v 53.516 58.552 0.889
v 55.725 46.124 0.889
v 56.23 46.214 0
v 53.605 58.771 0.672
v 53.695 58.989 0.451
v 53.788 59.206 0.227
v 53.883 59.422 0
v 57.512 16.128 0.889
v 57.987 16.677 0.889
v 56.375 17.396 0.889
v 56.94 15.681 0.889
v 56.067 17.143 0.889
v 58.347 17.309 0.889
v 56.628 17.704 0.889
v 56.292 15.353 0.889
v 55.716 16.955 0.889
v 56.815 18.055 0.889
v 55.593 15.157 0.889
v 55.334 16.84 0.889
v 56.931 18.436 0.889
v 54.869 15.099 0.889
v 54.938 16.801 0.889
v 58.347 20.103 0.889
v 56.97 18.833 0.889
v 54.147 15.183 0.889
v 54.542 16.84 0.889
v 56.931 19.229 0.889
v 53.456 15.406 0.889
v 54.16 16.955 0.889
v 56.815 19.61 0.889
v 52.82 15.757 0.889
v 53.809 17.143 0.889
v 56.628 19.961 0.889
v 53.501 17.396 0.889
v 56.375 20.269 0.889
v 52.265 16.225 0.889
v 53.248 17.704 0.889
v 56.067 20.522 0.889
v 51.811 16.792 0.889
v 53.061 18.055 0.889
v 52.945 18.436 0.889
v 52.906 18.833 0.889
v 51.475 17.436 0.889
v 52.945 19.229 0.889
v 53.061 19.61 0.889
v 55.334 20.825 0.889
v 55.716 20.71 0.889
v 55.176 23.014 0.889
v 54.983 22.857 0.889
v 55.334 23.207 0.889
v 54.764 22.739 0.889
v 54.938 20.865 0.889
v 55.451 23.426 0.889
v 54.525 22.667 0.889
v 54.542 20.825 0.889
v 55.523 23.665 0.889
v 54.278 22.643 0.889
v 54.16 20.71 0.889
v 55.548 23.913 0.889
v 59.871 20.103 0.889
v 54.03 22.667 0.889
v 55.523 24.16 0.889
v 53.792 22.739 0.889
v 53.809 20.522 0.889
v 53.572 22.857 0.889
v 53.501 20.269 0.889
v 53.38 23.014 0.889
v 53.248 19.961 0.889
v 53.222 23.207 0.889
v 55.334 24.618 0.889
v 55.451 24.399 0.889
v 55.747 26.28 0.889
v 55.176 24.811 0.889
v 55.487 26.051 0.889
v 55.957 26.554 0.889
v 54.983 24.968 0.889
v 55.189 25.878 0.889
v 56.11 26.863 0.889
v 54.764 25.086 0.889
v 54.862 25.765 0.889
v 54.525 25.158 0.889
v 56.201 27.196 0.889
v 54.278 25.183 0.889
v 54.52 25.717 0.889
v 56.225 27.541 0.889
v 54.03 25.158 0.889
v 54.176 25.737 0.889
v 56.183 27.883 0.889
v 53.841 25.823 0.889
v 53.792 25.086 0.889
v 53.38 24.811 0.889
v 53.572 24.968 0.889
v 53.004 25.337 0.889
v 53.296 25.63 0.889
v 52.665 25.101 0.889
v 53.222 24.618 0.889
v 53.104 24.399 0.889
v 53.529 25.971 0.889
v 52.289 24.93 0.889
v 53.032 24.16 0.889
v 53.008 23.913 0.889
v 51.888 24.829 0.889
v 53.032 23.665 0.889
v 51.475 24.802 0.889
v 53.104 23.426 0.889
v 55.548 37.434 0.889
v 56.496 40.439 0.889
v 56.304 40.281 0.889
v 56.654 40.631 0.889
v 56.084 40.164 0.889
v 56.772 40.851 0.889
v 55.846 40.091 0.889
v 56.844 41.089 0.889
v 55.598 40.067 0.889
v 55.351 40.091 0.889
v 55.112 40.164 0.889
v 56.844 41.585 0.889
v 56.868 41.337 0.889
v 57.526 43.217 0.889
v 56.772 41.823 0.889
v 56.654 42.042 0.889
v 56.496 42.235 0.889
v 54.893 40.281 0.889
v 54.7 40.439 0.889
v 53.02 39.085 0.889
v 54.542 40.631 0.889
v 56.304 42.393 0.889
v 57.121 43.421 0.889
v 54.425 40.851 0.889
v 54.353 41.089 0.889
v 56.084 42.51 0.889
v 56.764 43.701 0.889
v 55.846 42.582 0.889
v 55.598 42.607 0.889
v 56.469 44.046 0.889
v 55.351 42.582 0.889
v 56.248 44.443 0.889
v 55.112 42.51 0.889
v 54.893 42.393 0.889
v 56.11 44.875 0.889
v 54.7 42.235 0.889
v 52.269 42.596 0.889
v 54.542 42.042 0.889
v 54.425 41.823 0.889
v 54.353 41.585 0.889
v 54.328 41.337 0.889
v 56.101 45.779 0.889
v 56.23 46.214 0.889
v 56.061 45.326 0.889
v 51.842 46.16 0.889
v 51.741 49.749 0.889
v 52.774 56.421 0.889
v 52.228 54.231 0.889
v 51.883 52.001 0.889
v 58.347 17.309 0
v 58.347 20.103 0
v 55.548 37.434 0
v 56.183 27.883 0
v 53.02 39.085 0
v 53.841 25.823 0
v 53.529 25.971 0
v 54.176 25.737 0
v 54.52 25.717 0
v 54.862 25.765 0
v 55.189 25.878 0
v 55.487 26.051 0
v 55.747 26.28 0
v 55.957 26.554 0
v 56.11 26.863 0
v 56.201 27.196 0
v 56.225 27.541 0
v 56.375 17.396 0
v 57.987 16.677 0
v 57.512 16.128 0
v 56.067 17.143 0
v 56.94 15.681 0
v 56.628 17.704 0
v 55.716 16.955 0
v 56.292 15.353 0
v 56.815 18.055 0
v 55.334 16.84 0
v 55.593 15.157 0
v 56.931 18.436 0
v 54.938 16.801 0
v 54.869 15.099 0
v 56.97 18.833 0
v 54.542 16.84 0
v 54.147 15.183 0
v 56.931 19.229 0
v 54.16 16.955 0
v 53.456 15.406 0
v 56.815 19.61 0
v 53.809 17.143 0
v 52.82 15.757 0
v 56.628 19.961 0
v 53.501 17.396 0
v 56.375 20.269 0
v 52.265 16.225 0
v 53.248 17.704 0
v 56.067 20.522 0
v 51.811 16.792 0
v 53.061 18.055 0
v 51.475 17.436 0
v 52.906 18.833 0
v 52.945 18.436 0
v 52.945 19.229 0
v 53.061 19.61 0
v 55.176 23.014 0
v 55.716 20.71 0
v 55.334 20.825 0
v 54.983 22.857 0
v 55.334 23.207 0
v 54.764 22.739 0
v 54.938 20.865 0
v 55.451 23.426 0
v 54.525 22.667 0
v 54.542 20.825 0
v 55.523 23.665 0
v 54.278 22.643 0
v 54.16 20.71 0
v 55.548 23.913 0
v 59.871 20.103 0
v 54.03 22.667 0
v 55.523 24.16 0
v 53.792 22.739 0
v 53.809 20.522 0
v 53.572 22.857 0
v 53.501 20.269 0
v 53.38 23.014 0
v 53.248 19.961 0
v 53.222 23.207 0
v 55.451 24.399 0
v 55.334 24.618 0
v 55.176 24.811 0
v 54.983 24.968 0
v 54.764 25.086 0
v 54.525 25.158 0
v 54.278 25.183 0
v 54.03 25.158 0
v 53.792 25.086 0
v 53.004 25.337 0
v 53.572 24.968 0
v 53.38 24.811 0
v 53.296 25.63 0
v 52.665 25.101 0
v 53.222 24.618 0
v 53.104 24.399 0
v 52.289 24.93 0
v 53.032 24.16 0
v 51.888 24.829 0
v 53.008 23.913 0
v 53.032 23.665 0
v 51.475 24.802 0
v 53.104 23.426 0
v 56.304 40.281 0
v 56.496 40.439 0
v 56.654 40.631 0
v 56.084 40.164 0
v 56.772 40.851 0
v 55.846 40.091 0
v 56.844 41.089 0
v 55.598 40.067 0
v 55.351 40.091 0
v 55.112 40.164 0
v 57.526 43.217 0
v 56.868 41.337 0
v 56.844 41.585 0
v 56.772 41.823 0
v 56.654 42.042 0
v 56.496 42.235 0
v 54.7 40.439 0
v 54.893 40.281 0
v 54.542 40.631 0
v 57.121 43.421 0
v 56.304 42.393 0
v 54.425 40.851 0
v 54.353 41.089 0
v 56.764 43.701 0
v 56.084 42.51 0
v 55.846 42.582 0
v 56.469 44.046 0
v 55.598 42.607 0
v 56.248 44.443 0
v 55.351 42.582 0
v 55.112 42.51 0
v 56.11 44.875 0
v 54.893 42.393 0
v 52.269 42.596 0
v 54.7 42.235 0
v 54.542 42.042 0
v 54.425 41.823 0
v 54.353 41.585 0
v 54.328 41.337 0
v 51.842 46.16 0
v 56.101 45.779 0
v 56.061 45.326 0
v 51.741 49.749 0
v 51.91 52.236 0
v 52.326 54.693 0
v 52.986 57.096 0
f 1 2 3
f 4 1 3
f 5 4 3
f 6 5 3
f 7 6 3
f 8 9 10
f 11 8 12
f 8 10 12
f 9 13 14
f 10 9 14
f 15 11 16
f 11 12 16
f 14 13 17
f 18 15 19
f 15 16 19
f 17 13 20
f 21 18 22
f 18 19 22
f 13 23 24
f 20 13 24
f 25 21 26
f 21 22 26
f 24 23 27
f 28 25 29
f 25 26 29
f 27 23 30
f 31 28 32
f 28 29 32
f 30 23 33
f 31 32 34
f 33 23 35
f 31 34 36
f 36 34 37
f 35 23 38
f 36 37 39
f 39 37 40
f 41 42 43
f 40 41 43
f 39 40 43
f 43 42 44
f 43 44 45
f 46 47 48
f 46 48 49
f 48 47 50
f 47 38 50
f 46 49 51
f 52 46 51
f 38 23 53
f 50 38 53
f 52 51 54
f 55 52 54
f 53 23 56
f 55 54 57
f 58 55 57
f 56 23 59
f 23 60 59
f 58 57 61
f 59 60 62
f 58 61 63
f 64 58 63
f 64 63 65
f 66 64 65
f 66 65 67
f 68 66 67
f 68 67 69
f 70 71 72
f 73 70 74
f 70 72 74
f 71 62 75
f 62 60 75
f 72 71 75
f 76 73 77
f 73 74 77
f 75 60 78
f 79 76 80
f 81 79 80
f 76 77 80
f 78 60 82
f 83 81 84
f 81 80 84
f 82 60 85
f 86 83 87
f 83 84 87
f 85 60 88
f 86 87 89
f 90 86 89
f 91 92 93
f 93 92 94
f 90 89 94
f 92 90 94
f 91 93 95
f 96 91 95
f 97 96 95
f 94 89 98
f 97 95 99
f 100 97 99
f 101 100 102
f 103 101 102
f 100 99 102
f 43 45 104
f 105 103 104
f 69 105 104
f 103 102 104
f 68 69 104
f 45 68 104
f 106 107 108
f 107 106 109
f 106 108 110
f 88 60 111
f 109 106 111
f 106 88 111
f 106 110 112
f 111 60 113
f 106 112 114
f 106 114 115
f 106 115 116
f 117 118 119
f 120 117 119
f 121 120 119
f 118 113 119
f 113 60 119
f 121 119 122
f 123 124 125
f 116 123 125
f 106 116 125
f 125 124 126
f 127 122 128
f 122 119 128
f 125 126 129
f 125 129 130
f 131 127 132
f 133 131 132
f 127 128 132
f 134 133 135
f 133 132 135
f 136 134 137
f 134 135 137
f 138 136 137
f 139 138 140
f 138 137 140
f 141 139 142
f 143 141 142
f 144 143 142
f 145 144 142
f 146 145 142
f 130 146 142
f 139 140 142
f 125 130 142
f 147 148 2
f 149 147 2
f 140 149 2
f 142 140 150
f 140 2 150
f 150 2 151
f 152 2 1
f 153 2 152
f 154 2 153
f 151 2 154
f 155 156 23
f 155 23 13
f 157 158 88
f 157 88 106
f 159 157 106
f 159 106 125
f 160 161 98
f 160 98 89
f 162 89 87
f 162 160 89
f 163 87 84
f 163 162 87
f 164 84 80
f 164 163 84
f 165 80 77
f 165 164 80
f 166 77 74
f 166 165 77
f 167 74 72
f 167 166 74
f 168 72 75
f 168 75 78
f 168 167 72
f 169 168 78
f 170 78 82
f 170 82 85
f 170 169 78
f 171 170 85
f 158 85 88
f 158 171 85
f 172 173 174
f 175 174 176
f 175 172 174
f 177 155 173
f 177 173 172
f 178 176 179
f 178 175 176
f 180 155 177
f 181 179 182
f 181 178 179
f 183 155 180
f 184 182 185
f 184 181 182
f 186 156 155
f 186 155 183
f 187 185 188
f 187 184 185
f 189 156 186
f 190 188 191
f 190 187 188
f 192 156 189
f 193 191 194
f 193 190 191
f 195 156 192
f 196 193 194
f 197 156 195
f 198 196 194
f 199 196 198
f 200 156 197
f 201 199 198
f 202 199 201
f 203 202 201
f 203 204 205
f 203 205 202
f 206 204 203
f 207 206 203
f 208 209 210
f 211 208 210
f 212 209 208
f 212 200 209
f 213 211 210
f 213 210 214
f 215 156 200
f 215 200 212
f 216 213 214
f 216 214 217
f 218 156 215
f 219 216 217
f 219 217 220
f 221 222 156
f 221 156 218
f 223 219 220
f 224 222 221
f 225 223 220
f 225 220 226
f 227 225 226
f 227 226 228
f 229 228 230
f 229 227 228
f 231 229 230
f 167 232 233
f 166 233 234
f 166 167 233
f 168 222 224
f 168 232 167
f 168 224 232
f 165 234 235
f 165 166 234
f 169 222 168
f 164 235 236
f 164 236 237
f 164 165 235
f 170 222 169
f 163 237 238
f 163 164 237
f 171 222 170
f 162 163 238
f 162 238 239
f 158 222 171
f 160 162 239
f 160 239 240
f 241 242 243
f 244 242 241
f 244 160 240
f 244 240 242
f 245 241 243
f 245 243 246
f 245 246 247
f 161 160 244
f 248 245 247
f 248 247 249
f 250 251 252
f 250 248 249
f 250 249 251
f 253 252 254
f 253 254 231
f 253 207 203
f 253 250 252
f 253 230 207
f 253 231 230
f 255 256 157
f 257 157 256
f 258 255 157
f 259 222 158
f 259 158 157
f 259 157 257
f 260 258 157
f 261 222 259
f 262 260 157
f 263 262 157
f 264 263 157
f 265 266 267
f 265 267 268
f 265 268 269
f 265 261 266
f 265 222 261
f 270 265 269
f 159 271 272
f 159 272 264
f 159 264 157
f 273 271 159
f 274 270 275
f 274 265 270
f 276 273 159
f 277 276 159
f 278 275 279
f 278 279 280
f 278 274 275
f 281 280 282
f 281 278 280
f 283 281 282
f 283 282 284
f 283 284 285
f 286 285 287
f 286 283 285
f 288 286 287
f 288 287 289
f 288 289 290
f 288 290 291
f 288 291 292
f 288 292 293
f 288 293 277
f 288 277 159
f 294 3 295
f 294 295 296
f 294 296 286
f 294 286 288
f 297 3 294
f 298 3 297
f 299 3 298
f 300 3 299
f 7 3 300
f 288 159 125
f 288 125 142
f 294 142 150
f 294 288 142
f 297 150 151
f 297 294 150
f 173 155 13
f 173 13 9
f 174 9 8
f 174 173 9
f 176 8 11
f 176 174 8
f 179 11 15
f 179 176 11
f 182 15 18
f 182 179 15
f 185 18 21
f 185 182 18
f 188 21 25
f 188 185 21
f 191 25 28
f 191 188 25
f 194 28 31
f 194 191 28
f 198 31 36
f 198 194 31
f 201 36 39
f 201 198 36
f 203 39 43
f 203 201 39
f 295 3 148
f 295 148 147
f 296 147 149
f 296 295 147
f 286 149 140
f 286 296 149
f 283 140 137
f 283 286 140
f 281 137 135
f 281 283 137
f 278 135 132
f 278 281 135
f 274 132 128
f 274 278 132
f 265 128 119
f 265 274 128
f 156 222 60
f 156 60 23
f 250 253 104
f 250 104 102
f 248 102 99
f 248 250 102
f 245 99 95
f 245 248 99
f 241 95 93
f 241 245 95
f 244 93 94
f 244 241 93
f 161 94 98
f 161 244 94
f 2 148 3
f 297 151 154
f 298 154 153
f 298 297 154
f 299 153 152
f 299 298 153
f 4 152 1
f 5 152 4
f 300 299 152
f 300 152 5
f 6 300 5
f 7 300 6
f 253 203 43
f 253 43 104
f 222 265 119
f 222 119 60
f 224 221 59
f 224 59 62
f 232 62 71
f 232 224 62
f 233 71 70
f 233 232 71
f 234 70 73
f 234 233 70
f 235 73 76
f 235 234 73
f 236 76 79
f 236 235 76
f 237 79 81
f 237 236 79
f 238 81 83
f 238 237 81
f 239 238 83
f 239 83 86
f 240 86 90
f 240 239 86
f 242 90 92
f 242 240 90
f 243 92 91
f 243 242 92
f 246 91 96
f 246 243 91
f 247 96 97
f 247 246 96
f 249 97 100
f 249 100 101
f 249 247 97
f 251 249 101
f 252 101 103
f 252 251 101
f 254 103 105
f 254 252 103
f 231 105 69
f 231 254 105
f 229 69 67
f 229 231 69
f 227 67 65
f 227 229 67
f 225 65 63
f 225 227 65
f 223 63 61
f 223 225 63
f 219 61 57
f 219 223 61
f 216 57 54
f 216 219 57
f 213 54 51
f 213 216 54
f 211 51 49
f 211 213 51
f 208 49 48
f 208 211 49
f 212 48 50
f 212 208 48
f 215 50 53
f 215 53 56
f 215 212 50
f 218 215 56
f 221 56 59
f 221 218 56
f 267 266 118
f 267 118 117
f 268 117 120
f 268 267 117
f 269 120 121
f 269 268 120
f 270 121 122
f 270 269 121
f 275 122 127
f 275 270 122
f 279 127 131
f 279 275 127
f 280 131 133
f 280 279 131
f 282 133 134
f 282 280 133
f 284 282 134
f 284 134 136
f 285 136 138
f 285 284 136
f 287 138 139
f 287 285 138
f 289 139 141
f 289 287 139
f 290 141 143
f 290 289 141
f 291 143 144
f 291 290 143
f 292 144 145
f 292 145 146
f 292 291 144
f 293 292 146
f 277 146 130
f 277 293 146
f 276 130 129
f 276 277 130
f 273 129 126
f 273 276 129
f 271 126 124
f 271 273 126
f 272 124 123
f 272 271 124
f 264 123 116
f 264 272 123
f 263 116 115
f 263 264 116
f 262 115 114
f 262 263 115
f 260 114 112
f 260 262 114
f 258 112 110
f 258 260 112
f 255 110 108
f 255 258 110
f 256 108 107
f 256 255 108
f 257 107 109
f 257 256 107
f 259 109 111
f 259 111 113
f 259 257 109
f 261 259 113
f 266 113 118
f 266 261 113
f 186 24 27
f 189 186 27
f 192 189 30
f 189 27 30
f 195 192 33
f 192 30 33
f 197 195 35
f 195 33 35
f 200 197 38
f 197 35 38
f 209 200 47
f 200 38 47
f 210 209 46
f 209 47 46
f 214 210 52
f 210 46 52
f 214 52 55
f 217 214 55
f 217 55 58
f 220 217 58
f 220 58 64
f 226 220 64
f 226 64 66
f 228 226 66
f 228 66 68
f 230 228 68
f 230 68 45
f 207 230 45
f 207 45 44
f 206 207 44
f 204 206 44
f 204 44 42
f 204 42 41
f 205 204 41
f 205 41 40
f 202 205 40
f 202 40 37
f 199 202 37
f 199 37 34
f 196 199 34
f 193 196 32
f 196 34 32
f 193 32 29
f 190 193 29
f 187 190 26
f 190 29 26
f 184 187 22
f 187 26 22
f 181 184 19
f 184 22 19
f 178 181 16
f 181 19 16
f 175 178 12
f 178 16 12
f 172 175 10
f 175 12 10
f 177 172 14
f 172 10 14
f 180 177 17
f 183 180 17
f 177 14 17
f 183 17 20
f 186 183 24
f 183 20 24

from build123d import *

# Parameters (mm, degrees)
SKETCH1_R           = 1.27
BOSS_EXTRUDE3_DEPTH = 0.889
SKETCH3_R           = 2.032
CUT_EXTRUDE1_DEPTH  = 1.889
CUT_EXTRUDE2_DEPTH  = 24.373709


with BuildPart() as part:
    # Sketch1 → Boss-Extrude3 (new body)
    with BuildSketch(Plane.XY):
        with BuildLine():
            Line((53.882826418, 59.421700713), (56.230021181, 46.213700713))
            ThreePointArc((56.230021181, 46.213700713), (56.248351323, 44.442871919), (57.525920997, 43.216500713))
            Line((57.525920997, 43.216500713), (59.870620113, 20.102500713))
            Line((59.870620113, 20.102500713), (58.346620113, 20.102500713))
            Line((58.346620113, 20.102500713), (58.346620113, 17.308500713))
            ThreePointArc((58.346620113, 17.308500713), (54.868586202, 15.099346005), (51.475082329, 17.436270454))
            Line((51.475082329, 17.436270454), (51.475082329, 24.802270454))
            ThreePointArc((51.475082329, 24.802270454), (52.66510076, 25.100716041), (53.529437672, 25.971425715))
            ThreePointArc((53.529437672, 25.971425715), (55.487269989, 26.051421604), (56.18260068, 27.883366459))
            Line((56.18260068, 27.883366459), (55.54760068, 37.433766459))
            Line((55.54760068, 37.433766459), (53.019584786, 39.084766459))
            ThreePointArc((53.019584786, 39.084766459), (52.015147123, 44.373161392), (51.741430513, 49.749135277))
            ThreePointArc((51.741430513, 49.749135277), (52.3260698, 54.693025851), (53.882826418, 59.421700713))
        make_face()
        with Locations((55.59840068, 41.336900713)):
            Circle(SKETCH1_R, mode=Mode.SUBTRACT)
        with Locations((54.27760068, 23.912500713)):
            Circle(SKETCH1_R, mode=Mode.SUBTRACT)
    extrude(amount=BOSS_EXTRUDE3_DEPTH)

    # Sketch3 → Cut-Extrude1 (cut, through all)
    with BuildSketch(Plane.XY.offset(0.889)):
        with Locations((54.93800068, 18.832500713)):
            Circle(SKETCH3_R)
    extrude(amount=-CUT_EXTRUDE1_DEPTH, mode=Mode.SUBTRACT)

    # Sketch4 → Cut-Extrude2 (cut)
    with BuildSketch(Plane(origin=(-10.504426242, 59.109905984, 0), x_dir=(0.984573992, 0.174968725, 0), z_dir=(-0.174968725, 0.984573992, 0))):
        Polygon((63.448568698, 0), (63.448568698, -0.889), (62.935304309, -0.889), align=None)
    extrude(amount=-CUT_EXTRUDE2_DEPTH, mode=Mode.SUBTRACT)


solid = part.part
